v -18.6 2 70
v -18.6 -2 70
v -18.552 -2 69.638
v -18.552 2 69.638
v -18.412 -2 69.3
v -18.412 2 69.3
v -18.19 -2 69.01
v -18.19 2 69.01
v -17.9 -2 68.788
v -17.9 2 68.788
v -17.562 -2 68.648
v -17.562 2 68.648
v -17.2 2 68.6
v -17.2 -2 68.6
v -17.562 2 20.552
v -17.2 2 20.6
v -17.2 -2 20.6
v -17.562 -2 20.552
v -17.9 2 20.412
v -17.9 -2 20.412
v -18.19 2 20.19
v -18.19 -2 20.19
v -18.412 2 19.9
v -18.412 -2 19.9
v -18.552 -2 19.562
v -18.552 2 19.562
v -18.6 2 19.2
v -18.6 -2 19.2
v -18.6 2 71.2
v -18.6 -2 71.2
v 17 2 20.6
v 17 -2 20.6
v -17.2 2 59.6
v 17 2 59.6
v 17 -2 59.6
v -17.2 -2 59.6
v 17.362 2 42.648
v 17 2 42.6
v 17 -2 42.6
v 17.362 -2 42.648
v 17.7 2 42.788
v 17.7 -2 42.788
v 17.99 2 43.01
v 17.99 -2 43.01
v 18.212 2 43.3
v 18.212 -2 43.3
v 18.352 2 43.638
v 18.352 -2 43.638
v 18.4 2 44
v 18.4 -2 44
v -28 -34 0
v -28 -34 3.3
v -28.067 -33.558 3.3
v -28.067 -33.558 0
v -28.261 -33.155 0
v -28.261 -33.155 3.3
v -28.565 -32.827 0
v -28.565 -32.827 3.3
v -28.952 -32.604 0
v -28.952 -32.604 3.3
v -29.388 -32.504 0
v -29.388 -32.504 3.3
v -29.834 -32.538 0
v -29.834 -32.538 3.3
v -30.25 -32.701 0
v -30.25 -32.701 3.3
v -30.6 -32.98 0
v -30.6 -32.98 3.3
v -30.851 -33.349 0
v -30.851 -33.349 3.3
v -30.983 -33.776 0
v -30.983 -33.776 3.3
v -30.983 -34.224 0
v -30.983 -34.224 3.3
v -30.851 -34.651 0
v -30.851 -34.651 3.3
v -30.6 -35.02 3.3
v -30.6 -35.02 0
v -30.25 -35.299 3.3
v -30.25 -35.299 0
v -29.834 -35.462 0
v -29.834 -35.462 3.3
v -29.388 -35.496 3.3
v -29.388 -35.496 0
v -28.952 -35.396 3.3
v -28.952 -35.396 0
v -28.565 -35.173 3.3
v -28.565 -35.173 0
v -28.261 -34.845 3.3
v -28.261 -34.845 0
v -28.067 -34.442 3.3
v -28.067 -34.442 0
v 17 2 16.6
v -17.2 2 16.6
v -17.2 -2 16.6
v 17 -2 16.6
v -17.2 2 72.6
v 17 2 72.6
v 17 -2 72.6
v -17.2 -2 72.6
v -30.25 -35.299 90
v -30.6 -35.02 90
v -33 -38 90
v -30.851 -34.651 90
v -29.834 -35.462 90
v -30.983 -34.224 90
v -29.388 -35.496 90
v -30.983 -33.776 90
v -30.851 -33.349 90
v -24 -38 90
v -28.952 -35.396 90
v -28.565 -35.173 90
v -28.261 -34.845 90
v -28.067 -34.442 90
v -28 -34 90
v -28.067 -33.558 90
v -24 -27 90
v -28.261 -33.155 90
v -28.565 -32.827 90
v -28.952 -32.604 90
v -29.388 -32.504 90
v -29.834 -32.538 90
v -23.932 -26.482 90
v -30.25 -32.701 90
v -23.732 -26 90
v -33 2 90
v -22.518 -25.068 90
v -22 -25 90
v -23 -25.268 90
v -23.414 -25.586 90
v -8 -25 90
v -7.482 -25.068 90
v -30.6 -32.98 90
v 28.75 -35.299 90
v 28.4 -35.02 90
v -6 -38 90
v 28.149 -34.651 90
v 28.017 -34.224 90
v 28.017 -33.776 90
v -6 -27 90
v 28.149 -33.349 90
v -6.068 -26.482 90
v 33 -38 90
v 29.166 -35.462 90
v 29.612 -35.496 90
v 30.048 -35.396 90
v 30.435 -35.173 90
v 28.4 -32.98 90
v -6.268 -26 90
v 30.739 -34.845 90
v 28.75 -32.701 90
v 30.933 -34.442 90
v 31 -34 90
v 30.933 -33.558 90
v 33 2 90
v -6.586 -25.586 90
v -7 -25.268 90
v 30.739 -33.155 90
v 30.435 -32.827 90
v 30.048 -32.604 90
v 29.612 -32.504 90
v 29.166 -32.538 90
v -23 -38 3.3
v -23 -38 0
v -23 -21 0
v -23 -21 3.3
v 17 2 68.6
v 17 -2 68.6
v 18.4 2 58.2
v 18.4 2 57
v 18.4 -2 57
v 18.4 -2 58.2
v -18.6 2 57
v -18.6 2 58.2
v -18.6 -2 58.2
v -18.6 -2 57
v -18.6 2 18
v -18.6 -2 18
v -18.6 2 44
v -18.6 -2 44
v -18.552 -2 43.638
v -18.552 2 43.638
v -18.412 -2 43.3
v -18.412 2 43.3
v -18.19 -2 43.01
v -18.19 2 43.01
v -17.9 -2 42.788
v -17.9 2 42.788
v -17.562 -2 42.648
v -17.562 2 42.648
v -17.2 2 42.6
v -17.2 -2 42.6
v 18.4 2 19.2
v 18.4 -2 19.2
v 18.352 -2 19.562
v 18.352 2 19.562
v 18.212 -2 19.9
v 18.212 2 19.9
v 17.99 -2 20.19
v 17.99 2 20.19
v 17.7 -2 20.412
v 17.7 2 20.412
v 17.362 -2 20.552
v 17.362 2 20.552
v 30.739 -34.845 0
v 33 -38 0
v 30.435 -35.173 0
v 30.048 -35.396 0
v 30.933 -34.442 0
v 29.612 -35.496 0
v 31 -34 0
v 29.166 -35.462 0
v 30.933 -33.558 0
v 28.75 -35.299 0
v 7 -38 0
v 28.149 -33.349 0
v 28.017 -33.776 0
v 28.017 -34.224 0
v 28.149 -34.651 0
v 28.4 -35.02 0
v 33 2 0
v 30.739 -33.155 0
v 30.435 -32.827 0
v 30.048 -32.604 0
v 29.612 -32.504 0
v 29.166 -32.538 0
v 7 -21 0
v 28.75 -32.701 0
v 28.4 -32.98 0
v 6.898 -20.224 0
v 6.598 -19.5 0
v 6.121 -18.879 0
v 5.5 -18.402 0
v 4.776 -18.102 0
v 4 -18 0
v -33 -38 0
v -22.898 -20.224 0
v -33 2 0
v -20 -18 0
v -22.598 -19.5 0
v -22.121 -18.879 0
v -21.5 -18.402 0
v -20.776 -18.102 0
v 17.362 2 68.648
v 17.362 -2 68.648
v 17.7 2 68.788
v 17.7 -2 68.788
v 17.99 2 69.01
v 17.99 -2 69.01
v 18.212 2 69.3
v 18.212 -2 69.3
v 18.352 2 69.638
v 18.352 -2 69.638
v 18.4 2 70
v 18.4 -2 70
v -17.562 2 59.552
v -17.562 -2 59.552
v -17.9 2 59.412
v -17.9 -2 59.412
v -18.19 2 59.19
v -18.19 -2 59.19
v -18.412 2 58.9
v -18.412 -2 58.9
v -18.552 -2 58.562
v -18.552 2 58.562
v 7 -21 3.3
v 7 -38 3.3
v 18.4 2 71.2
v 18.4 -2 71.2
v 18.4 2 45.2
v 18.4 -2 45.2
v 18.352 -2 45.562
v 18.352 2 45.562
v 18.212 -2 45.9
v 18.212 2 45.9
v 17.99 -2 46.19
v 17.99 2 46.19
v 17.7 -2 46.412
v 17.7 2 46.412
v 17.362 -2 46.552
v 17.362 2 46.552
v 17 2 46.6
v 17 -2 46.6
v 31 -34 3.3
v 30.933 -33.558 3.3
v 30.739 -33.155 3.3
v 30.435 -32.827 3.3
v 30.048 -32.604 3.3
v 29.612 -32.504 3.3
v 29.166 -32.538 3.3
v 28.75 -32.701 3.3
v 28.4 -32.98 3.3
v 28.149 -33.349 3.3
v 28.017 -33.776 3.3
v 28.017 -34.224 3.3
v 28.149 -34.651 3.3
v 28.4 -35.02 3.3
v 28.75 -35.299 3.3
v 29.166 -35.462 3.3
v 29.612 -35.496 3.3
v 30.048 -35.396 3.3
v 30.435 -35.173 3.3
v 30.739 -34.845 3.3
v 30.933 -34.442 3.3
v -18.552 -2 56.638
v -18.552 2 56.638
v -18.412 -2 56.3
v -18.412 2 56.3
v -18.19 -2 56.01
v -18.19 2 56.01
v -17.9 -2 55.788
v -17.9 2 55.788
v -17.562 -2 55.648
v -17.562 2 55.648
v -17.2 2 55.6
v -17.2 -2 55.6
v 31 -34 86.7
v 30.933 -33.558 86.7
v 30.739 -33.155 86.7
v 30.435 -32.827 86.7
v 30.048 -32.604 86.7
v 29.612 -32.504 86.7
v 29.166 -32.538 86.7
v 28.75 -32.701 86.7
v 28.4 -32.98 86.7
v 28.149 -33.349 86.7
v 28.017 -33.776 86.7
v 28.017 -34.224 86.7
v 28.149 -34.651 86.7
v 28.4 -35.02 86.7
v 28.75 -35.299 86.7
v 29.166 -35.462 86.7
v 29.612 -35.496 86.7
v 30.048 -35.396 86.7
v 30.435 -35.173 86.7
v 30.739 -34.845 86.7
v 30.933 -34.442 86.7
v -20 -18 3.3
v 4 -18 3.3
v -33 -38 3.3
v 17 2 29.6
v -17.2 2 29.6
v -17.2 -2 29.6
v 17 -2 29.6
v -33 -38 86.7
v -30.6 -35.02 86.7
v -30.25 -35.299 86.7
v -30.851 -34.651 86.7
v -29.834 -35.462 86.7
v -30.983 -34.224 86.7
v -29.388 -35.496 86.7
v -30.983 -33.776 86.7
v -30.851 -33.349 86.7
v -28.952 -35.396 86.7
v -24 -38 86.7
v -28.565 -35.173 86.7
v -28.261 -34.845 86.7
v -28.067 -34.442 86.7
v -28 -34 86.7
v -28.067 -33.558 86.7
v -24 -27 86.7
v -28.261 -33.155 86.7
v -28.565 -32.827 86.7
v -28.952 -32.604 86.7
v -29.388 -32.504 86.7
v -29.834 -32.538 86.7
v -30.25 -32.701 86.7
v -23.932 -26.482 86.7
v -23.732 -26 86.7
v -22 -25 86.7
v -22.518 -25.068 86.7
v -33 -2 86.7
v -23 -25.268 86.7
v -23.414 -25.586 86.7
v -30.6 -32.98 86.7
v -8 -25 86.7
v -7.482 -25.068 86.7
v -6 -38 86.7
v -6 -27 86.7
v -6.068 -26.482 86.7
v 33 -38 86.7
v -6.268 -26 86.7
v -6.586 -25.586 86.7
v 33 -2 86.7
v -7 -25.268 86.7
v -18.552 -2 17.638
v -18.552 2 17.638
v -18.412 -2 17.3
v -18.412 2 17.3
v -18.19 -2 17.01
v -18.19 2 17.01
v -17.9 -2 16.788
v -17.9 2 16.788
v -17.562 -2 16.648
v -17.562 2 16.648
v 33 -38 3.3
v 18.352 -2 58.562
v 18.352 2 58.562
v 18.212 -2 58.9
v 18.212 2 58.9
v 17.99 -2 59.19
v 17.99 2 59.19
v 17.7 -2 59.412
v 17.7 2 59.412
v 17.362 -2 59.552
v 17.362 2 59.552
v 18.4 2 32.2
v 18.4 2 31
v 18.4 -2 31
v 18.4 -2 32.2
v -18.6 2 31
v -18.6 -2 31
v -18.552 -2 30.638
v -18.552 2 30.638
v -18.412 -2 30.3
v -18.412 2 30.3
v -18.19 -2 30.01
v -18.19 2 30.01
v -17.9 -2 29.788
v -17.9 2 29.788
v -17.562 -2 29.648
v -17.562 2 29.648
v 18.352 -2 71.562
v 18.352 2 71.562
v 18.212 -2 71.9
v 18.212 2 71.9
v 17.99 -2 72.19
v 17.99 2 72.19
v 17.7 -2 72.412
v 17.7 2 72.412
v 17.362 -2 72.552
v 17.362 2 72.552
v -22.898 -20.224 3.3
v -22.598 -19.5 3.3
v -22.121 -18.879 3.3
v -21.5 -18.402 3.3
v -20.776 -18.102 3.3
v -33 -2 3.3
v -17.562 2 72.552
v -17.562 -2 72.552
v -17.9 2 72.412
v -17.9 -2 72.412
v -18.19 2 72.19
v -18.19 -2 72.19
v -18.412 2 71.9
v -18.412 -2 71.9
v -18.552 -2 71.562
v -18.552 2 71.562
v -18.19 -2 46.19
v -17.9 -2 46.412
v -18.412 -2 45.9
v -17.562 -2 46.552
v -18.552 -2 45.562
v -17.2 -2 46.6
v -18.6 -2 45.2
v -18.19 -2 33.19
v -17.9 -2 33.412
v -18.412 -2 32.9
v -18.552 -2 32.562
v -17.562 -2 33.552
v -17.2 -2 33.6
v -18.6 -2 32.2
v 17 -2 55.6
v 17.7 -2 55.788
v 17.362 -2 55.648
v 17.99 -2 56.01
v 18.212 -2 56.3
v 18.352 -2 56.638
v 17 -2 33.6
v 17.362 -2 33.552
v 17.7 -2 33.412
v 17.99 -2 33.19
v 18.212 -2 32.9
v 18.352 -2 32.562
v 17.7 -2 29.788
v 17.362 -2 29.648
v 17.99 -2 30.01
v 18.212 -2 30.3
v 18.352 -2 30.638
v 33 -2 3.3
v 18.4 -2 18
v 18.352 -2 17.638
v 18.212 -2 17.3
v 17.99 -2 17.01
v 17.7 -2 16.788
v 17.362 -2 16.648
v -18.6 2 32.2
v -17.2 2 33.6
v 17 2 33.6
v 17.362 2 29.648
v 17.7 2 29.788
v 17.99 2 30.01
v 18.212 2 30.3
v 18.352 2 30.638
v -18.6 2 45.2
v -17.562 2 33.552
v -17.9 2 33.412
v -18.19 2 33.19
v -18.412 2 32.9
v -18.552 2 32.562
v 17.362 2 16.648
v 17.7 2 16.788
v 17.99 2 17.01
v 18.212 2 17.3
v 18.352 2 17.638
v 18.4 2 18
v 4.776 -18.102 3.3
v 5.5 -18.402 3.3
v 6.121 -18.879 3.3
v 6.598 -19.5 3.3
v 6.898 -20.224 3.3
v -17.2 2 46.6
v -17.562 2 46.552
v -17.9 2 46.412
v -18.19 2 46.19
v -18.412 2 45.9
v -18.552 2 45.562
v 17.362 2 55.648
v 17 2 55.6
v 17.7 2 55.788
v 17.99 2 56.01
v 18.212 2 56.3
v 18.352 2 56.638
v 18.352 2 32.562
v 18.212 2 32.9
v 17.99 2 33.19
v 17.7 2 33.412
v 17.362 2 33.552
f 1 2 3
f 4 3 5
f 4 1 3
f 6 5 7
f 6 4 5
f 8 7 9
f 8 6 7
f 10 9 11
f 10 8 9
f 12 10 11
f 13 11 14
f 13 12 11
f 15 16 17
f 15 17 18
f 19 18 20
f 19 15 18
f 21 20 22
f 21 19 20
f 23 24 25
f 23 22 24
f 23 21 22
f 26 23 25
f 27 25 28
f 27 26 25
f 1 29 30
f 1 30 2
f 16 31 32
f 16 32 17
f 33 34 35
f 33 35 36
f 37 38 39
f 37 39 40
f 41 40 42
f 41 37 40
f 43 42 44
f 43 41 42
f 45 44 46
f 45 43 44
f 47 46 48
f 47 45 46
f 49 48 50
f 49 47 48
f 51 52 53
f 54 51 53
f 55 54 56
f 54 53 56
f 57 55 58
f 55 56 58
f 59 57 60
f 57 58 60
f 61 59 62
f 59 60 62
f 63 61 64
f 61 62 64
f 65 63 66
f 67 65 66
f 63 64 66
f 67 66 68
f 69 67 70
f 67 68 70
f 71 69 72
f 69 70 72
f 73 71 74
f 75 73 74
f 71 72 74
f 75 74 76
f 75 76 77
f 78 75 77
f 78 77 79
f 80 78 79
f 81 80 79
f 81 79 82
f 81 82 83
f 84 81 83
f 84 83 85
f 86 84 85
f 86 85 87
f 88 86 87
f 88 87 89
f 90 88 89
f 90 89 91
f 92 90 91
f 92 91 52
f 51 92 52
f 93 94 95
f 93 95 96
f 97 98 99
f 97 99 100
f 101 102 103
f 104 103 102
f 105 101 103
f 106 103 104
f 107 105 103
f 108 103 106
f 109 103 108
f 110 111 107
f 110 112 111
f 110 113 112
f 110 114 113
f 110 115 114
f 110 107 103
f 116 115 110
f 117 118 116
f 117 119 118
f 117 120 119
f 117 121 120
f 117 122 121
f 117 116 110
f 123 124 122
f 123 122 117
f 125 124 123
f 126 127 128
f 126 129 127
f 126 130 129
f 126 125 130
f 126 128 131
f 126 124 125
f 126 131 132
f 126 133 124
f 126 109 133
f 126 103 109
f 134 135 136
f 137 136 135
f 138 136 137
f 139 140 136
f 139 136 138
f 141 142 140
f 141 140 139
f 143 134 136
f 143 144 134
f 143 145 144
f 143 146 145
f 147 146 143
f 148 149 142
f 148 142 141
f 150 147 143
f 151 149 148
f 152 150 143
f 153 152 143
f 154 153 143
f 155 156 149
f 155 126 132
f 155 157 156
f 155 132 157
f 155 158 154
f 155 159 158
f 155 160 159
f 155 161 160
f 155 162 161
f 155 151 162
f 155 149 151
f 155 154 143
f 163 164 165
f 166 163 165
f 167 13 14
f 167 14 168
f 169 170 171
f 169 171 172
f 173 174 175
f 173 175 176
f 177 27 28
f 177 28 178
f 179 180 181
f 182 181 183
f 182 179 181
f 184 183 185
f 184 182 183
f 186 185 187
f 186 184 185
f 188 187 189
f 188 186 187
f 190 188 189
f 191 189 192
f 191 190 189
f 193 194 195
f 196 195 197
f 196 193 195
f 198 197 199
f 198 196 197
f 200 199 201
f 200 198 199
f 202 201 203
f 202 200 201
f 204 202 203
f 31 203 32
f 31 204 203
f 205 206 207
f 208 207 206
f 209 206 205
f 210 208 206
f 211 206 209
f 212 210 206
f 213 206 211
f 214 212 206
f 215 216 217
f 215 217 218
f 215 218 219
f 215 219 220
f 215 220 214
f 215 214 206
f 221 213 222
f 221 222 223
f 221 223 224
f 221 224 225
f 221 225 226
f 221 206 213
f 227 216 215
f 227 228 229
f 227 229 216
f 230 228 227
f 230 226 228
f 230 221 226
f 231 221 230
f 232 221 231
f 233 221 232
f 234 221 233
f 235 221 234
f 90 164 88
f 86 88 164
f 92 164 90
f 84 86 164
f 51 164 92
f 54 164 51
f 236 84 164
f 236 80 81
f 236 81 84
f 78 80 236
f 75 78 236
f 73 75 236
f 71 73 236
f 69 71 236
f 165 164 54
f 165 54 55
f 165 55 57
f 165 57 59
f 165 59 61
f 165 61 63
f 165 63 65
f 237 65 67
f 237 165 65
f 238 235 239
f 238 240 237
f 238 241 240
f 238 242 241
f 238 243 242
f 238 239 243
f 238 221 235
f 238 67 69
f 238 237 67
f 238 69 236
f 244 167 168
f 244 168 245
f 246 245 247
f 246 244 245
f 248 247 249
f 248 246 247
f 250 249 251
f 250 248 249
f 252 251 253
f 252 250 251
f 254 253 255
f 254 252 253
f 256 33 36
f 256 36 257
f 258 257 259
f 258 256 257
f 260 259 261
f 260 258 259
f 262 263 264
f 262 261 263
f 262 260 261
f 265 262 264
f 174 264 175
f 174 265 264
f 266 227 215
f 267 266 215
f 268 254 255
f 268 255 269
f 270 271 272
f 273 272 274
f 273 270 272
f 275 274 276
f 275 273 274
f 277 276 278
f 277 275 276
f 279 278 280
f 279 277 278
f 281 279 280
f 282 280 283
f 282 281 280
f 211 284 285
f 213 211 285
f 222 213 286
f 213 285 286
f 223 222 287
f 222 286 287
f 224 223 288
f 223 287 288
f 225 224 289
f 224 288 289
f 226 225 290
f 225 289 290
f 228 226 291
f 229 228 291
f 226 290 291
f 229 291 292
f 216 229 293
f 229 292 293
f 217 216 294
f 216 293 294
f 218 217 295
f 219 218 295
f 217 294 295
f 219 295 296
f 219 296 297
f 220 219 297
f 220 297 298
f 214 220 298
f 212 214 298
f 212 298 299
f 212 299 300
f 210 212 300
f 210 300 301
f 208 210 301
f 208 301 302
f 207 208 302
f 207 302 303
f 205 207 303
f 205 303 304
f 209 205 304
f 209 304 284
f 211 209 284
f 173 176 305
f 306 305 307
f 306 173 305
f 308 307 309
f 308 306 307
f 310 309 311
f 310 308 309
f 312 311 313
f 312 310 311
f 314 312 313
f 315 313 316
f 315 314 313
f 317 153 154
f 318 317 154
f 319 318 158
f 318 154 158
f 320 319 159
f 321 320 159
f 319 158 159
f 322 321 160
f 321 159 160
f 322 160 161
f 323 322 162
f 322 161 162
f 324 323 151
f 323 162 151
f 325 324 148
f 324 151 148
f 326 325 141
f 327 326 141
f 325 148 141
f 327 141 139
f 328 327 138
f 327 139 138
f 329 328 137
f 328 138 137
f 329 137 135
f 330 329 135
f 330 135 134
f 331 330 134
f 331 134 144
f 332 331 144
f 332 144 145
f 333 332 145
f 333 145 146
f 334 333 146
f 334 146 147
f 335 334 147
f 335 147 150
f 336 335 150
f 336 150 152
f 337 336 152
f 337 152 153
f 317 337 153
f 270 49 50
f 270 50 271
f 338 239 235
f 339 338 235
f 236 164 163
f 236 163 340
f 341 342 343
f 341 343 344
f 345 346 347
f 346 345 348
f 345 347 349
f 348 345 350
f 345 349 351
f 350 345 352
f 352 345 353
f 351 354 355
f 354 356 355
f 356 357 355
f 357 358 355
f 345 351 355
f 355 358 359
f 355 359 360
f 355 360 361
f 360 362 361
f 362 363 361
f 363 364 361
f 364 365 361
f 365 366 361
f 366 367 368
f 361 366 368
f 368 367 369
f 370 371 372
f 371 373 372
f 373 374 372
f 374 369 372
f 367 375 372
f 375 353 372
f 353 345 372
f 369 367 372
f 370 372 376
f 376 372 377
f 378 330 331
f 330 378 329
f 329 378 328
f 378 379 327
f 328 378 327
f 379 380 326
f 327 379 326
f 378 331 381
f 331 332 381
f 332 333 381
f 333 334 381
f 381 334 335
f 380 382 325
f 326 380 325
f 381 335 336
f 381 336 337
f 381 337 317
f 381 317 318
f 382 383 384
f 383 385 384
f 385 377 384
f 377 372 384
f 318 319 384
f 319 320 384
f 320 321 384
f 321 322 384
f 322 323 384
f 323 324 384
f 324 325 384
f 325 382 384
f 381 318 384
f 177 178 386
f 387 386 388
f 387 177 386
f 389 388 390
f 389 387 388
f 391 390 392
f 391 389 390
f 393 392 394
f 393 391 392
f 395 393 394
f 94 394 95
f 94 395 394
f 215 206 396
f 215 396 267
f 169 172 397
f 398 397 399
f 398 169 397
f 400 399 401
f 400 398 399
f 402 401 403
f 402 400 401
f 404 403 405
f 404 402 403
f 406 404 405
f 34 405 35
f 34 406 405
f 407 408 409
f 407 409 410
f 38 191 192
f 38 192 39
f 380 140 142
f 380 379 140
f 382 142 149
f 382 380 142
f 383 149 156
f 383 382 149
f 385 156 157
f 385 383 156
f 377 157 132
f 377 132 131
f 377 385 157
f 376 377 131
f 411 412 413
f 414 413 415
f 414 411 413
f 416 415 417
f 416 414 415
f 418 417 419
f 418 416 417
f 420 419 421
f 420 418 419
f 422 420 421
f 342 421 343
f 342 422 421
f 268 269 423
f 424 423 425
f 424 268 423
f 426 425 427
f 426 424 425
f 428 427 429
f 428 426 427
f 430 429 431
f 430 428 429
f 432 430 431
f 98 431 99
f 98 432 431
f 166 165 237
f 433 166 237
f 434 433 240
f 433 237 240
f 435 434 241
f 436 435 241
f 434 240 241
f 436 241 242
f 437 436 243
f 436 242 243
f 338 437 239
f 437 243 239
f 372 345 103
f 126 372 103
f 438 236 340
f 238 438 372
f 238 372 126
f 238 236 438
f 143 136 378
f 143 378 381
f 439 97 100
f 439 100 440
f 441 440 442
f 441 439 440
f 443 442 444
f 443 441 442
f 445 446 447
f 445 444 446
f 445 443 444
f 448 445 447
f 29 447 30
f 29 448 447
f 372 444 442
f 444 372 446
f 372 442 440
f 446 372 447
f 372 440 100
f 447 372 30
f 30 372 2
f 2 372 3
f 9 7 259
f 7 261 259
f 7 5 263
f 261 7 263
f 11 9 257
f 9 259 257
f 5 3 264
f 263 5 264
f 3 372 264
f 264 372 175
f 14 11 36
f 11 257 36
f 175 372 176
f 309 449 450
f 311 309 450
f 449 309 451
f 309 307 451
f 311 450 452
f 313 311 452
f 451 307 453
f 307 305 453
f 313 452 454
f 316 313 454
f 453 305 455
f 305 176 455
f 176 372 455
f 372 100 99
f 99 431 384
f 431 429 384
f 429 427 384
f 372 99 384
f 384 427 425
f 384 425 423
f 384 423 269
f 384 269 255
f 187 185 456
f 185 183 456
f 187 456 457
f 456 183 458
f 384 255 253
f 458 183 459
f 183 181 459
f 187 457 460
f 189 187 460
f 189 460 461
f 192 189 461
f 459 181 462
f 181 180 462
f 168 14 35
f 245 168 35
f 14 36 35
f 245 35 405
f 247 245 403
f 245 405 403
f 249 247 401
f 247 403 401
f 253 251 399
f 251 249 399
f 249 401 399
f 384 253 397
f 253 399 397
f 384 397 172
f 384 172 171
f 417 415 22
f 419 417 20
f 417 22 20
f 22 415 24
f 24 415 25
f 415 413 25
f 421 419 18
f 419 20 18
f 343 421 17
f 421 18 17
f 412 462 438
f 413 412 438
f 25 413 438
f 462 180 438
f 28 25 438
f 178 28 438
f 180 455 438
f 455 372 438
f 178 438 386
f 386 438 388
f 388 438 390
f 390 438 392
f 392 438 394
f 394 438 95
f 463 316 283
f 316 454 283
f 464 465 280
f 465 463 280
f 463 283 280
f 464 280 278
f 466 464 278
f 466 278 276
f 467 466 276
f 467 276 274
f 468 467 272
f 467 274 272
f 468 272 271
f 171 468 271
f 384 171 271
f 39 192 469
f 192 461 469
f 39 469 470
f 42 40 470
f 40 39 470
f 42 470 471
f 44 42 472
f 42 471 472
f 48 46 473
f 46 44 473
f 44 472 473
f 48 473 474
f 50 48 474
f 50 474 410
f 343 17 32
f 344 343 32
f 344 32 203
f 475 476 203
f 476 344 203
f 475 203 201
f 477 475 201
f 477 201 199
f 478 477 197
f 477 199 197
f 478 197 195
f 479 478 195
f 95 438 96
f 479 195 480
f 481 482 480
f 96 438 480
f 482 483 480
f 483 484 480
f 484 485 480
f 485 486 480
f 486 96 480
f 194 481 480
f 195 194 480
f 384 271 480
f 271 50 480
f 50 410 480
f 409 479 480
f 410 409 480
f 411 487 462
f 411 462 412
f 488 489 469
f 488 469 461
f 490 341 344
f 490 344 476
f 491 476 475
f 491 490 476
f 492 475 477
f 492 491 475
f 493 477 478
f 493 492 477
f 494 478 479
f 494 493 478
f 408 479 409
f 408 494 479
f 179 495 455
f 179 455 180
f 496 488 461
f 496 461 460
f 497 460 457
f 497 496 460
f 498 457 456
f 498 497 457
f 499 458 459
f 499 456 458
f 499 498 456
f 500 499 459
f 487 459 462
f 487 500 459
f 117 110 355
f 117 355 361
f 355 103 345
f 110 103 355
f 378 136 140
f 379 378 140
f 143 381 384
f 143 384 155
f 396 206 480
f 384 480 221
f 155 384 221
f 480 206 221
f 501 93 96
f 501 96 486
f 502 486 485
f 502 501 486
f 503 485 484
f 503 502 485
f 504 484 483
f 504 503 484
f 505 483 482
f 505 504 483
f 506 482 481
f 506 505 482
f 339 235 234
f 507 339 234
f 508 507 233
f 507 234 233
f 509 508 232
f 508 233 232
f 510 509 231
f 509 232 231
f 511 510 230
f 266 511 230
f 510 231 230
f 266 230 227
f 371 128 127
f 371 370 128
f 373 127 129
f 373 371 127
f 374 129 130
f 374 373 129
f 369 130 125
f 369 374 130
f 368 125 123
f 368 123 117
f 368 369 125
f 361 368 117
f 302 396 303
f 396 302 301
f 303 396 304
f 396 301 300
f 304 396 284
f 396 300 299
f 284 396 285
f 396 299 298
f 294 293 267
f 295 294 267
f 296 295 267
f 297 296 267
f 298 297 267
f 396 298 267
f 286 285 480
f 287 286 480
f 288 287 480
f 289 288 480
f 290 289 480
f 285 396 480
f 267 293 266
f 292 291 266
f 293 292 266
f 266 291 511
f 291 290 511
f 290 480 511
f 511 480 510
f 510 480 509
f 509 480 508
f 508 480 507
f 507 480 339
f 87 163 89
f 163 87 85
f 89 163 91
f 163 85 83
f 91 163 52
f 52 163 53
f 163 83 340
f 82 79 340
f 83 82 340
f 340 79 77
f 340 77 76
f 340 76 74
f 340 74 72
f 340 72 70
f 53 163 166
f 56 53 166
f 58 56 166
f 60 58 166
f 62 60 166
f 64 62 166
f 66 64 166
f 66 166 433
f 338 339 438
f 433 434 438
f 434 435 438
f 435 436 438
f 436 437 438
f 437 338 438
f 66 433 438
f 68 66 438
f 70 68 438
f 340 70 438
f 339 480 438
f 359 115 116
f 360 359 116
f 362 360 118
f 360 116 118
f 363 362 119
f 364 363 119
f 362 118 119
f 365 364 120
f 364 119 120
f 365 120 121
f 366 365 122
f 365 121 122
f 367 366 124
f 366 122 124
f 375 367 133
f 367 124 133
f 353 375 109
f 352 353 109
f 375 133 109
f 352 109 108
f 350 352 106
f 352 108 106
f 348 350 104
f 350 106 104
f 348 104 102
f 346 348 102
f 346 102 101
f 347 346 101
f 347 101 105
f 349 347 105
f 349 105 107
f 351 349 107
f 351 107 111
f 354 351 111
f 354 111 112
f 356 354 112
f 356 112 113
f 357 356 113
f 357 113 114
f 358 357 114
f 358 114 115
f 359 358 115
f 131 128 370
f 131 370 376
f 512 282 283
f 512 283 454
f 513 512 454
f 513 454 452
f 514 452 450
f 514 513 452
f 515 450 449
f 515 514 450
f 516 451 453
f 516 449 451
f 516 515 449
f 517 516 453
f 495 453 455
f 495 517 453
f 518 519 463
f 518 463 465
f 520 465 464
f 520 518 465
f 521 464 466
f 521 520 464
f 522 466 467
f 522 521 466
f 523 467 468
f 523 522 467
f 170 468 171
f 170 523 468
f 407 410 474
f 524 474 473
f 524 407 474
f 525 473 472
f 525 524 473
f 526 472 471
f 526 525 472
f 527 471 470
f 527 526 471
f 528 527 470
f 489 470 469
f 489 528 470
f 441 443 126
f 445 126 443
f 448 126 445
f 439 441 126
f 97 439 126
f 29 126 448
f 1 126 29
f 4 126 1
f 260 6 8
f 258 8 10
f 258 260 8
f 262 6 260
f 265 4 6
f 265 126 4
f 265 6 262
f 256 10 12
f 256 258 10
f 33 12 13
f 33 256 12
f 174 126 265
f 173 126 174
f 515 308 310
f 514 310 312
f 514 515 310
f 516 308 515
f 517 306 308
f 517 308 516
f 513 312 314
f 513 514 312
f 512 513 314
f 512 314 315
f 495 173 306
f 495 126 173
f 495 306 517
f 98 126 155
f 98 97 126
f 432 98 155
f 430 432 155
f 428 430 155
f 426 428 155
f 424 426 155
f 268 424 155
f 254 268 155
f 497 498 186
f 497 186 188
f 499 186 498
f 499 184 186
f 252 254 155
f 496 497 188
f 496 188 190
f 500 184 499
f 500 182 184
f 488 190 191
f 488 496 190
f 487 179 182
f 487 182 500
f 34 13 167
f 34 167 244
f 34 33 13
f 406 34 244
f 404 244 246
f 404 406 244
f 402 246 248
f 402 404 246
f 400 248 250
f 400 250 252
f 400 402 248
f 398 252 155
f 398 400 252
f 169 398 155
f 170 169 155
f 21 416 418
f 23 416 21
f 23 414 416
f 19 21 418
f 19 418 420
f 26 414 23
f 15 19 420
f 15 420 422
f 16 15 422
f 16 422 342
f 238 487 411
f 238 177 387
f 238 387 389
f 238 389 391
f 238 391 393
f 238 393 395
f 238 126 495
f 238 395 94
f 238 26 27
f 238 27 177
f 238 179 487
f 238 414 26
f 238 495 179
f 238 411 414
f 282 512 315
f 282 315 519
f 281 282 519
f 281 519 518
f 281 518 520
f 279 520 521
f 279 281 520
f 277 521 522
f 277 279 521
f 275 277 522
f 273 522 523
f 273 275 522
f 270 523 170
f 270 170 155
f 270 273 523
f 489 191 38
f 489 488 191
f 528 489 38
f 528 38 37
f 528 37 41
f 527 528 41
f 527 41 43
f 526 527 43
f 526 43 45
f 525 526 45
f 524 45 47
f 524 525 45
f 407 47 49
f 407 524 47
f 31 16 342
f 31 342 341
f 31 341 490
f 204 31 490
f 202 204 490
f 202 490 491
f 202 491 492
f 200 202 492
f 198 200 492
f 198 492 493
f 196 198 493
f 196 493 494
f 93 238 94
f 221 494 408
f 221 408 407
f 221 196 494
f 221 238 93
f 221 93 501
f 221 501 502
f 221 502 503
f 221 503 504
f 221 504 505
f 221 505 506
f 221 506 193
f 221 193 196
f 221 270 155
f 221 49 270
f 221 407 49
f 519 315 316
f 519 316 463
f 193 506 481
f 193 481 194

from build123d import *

# Parameters (mm, degrees)
SKETCH1_W           = 66
SKETCH1_H           = 4
BOSS_EXTRUDE1_DEPTH = 90
SKETCH2_W           = 66
SKETCH2_H           = 36
BOSS_EXTRUDE2_DEPTH = 3.3
SKETCH3_W           = 66
SKETCH3_H           = 36
BOSS_EXTRUDE3_DEPTH = 3.3
SKETCH4_R           = 1.5
CUT_EXTRUDE1_DEPTH  = 104.116439039
CUT_EXTRUDE2_REACH  = 105.116
SKETCH5_W           = 18
SKETCH5_H           = 13
CUT_EXTRUDE4_REACH  = 105.116
FILLET1_R           = 2
CUT_EXTRUDE5_REACH  = 105.87
LPATTERN1_COUNT     = 5
LPATTERN1_PITCH     = 13


with BuildPart() as part:
    # Sketch1 → Boss-Extrude1 (new body)
    with BuildSketch(Plane.XY):
        Rectangle(SKETCH1_W, SKETCH1_H)
    extrude(amount=BOSS_EXTRUDE1_DEPTH)

    # Sketch2 → Boss-Extrude2 (add)
    with BuildSketch(Plane.XY.offset(90)):
        with Locations((0, -20)):
            Rectangle(SKETCH2_W, SKETCH2_H)
    extrude(amount=-BOSS_EXTRUDE2_DEPTH)

    # Sketch3 → Boss-Extrude3 (add)
    with BuildSketch(Plane(origin=(0, 0, 0), x_dir=(-1, 0, 0), z_dir=(0, 0, -1))):
        with Locations((0, -20)):
            Rectangle(SKETCH3_W, SKETCH3_H)
    extrude(amount=-BOSS_EXTRUDE3_DEPTH)

    # Sketch4 → Cut-Extrude1 (cut, through all)
    with BuildSketch(Plane.XY.offset(90)):
        with Locations((-29.5, -34)):
            Circle(SKETCH4_R)
        with Locations((29.5, -34)):
            Circle(SKETCH4_R)
    extrude(amount=-CUT_EXTRUDE1_DEPTH, mode=Mode.SUBTRACT)

    # Sketch5 → Cut-Extrude2 (cut, up to next)
    with BuildSketch(Plane.XY.offset(90), mode=Mode.PRIVATE) as cut_extrude2_sk1:
        with Locations((-15, -31.5)):
            Rectangle(SKETCH5_W, SKETCH5_H)
    cut_extrude2_tool1 = extrude(cut_extrude2_sk1.sketch, amount=-CUT_EXTRUDE2_REACH, mode=Mode.PRIVATE) & part.part
    add(cut_extrude2_tool1.solids().sort_by_distance((-15, -31.5, 90))[0], mode=Mode.SUBTRACT)

    # Sketch7 → Cut-Extrude4 (cut, up to next)
    with BuildSketch(Plane(origin=(0, 0, 0), x_dir=(-1, 0, 0), z_dir=(0, 0, -1)), mode=Mode.PRIVATE) as cut_extrude4_sk1:
        with BuildLine():
            Line((-7, -38), (23, -38))
            Line((23, -38), (23, -21))
            ThreePointArc((23, -21), (22.121320344, -18.878679656), (20, -18))
            Line((20, -18), (-4, -18))
            ThreePointArc((-4, -18), (-6.121320344, -18.878679656), (-7, -21))
            Line((-7, -21), (-7, -38))
        make_face()
    cut_extrude4_tool1 = extrude(cut_extrude4_sk1.sketch, amount=-CUT_EXTRUDE4_REACH, mode=Mode.PRIVATE) & part.part
    add(cut_extrude4_tool1.solids().sort_by_distance((-8, -28.060456, 0))[0], mode=Mode.SUBTRACT)

    # Fillet1
    fillet1_edges = [part.edges().sort_by_distance(p)[0] for p in [
        (-24, -25, 88.35),
        (-6, -25, 88.35),
    ]]
    fillet(fillet1_edges, radius=FILLET1_R)

    # Sketch8 → Cut-Extrude5 (cut, up to next)
    with BuildSketch(Plane(origin=(0, 2, 0), x_dir=(1, 0, 0), z_dir=(0, 1, 0)), mode=Mode.PRIVATE) as cut_extrude5_sk1:
        with BuildLine():
            Line((-17.2, -16.6), (17, -16.6))
            ThreePointArc((17, -16.6), (17.989949494, -17.010050506), (18.4, -18))
            Line((18.4, -18), (18.4, -19.2))
            ThreePointArc((18.4, -19.2), (17.989949494, -20.189949494), (17, -20.6))
            Line((17, -20.6), (-17.2, -20.6))
            ThreePointArc((-17.2, -20.6), (-18.189949494, -20.189949494), (-18.6, -19.2))
            Line((-18.6, -19.2), (-18.6, -18))
            ThreePointArc((-18.6, -18), (-18.189949494, -17.010050506), (-17.2, -16.6))
        make_face()
    cut_extrude5_tool1 = extrude(cut_extrude5_sk1.sketch, amount=-CUT_EXTRUDE5_REACH, mode=Mode.PRIVATE) & part.part
    cut_extrude5 = cut_extrude5_tool1.solids().sort_by_distance((-0.1, 2, 18.6))[0]
    add(cut_extrude5, mode=Mode.SUBTRACT)

    # LPattern1: Cut-Extrude5 ×5
    with Locations(*[(0, 0, i * LPATTERN1_PITCH) for i in range(1, LPATTERN1_COUNT)]):
        add(cut_extrude5, mode=Mode.SUBTRACT)


solid = part.part
